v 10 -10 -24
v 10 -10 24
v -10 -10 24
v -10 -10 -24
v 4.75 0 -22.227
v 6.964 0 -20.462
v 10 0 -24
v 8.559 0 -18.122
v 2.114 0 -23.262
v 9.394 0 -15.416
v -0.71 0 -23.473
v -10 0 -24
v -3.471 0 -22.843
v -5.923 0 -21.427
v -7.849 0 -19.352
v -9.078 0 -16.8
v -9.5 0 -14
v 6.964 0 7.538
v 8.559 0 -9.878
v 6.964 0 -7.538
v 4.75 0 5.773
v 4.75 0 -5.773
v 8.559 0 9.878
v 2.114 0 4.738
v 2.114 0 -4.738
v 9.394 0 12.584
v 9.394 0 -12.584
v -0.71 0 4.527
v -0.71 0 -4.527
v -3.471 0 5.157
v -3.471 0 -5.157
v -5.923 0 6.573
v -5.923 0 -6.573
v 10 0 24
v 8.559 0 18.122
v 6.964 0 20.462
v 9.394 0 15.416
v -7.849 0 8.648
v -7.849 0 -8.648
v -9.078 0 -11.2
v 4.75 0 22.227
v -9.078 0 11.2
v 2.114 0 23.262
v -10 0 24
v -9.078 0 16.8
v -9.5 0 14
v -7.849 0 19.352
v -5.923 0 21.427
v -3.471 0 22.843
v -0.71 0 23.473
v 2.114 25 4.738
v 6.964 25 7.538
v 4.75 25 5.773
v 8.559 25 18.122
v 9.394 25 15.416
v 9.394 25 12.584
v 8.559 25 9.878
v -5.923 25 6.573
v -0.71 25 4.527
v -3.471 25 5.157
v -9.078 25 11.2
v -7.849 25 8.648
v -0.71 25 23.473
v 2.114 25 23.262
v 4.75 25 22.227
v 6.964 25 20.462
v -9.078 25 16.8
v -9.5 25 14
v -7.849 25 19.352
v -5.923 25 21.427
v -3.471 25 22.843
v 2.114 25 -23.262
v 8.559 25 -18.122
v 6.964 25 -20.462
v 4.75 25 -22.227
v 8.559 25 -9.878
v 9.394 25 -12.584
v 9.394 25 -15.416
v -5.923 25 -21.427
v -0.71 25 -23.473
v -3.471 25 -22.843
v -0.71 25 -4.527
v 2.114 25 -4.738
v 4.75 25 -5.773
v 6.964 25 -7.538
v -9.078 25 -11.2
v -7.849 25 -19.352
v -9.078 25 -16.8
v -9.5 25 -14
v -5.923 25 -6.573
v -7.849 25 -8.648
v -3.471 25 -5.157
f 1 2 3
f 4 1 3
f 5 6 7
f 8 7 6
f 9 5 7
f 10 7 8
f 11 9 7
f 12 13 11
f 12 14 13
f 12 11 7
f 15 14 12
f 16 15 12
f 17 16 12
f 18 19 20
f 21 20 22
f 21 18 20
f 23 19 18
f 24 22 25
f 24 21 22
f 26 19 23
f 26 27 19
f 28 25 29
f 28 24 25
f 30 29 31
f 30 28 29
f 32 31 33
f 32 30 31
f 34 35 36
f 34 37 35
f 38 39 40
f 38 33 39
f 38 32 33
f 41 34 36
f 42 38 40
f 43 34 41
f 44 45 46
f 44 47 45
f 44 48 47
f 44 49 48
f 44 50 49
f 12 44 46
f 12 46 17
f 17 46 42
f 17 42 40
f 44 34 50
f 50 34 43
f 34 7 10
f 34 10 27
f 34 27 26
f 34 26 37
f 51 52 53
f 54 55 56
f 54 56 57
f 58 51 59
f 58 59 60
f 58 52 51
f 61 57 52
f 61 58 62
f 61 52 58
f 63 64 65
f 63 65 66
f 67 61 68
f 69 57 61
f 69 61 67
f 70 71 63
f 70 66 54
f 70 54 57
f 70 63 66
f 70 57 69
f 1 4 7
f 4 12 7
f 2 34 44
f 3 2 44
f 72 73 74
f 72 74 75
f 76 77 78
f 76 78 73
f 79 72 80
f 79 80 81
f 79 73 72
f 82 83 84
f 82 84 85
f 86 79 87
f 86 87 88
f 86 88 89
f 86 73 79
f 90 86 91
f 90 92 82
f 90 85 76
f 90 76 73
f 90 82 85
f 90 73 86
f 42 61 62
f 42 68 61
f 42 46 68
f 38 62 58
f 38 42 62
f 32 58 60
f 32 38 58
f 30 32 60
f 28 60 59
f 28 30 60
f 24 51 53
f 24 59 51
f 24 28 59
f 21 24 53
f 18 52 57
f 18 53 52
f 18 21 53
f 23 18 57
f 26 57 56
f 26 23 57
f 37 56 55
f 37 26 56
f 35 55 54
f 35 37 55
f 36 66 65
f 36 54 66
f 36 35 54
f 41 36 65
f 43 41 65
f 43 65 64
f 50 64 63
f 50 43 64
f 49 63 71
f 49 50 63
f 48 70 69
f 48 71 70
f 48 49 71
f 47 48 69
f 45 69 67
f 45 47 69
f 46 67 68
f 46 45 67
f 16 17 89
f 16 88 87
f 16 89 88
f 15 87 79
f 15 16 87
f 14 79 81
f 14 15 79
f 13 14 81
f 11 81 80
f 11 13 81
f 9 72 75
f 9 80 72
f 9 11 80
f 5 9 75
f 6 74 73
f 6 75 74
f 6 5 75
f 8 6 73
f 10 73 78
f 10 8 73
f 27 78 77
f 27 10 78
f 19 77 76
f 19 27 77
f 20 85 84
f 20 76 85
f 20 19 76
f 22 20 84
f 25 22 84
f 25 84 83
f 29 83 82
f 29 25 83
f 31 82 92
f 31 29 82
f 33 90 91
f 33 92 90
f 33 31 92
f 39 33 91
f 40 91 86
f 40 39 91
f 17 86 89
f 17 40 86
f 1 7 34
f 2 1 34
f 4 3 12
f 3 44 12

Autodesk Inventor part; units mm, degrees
ref_plane "YZ Plane" through (0, 0, 0) normal (1, 0, 0) x (0, 1, 0)
ref_plane "XZ Plane" through (0, 0, 0) normal (0, 1, 0) x (-1, 0, 0)
ref_plane "XY Plane" through (0, 0, 0) normal (0, 0, 1) x (1, 0, 0)
sketch "Sketch1" plane through (0, 0, 0) normal (0, 1, 0) x (-1, 0, 0)
  line L0 (-10, 24) -> (10, 24)
  line L1 (10, 24) -> (10, -24)
  line L2 (10, -24) -> (-10, -24)
  line L3 (-10, -24) -> (-10, 24)
  line L4 (-10, 24) -> (10, -24) construction
  line L5 (10, 24) -> (-10, -24) construction
  line L6 (0, 0) -> (0, -23.5) construction
  line L7 (0, -23.5) -> (0, -14) construction
  circle A0 centre (0, -14) radius 9.5
  line L8 (0, 0) -> (0, 23.5) construction
  line L9 (0, 23.5) -> (0, 14) construction
  circle A1 centre (0, 14) radius 9.5
  dimension "d0" = 20
  dimension "d1" = 48
  dimension "d2" = 23.5
  dimension "d3" = 9.5
  dimension "d4" = 19
  dimension "d5" = 23.5
  dimension "d6" = 9.5
  dimension "d7" = 19
extrude "Extrusion1" add sketch "Sketch1" along normal blind 25 contours A0 | A1
extrude "Extrusion2" add sketch "Sketch1" against normal blind 10
extrude "Extrusion3" add sketch "Sketch1" against normal blind 10 contours A1
extrude "Extrusion4" add sketch "Sketch1" against normal blind 10 contours A0
properties part number "LIDARLite" material "Acetal Resin, Black"
